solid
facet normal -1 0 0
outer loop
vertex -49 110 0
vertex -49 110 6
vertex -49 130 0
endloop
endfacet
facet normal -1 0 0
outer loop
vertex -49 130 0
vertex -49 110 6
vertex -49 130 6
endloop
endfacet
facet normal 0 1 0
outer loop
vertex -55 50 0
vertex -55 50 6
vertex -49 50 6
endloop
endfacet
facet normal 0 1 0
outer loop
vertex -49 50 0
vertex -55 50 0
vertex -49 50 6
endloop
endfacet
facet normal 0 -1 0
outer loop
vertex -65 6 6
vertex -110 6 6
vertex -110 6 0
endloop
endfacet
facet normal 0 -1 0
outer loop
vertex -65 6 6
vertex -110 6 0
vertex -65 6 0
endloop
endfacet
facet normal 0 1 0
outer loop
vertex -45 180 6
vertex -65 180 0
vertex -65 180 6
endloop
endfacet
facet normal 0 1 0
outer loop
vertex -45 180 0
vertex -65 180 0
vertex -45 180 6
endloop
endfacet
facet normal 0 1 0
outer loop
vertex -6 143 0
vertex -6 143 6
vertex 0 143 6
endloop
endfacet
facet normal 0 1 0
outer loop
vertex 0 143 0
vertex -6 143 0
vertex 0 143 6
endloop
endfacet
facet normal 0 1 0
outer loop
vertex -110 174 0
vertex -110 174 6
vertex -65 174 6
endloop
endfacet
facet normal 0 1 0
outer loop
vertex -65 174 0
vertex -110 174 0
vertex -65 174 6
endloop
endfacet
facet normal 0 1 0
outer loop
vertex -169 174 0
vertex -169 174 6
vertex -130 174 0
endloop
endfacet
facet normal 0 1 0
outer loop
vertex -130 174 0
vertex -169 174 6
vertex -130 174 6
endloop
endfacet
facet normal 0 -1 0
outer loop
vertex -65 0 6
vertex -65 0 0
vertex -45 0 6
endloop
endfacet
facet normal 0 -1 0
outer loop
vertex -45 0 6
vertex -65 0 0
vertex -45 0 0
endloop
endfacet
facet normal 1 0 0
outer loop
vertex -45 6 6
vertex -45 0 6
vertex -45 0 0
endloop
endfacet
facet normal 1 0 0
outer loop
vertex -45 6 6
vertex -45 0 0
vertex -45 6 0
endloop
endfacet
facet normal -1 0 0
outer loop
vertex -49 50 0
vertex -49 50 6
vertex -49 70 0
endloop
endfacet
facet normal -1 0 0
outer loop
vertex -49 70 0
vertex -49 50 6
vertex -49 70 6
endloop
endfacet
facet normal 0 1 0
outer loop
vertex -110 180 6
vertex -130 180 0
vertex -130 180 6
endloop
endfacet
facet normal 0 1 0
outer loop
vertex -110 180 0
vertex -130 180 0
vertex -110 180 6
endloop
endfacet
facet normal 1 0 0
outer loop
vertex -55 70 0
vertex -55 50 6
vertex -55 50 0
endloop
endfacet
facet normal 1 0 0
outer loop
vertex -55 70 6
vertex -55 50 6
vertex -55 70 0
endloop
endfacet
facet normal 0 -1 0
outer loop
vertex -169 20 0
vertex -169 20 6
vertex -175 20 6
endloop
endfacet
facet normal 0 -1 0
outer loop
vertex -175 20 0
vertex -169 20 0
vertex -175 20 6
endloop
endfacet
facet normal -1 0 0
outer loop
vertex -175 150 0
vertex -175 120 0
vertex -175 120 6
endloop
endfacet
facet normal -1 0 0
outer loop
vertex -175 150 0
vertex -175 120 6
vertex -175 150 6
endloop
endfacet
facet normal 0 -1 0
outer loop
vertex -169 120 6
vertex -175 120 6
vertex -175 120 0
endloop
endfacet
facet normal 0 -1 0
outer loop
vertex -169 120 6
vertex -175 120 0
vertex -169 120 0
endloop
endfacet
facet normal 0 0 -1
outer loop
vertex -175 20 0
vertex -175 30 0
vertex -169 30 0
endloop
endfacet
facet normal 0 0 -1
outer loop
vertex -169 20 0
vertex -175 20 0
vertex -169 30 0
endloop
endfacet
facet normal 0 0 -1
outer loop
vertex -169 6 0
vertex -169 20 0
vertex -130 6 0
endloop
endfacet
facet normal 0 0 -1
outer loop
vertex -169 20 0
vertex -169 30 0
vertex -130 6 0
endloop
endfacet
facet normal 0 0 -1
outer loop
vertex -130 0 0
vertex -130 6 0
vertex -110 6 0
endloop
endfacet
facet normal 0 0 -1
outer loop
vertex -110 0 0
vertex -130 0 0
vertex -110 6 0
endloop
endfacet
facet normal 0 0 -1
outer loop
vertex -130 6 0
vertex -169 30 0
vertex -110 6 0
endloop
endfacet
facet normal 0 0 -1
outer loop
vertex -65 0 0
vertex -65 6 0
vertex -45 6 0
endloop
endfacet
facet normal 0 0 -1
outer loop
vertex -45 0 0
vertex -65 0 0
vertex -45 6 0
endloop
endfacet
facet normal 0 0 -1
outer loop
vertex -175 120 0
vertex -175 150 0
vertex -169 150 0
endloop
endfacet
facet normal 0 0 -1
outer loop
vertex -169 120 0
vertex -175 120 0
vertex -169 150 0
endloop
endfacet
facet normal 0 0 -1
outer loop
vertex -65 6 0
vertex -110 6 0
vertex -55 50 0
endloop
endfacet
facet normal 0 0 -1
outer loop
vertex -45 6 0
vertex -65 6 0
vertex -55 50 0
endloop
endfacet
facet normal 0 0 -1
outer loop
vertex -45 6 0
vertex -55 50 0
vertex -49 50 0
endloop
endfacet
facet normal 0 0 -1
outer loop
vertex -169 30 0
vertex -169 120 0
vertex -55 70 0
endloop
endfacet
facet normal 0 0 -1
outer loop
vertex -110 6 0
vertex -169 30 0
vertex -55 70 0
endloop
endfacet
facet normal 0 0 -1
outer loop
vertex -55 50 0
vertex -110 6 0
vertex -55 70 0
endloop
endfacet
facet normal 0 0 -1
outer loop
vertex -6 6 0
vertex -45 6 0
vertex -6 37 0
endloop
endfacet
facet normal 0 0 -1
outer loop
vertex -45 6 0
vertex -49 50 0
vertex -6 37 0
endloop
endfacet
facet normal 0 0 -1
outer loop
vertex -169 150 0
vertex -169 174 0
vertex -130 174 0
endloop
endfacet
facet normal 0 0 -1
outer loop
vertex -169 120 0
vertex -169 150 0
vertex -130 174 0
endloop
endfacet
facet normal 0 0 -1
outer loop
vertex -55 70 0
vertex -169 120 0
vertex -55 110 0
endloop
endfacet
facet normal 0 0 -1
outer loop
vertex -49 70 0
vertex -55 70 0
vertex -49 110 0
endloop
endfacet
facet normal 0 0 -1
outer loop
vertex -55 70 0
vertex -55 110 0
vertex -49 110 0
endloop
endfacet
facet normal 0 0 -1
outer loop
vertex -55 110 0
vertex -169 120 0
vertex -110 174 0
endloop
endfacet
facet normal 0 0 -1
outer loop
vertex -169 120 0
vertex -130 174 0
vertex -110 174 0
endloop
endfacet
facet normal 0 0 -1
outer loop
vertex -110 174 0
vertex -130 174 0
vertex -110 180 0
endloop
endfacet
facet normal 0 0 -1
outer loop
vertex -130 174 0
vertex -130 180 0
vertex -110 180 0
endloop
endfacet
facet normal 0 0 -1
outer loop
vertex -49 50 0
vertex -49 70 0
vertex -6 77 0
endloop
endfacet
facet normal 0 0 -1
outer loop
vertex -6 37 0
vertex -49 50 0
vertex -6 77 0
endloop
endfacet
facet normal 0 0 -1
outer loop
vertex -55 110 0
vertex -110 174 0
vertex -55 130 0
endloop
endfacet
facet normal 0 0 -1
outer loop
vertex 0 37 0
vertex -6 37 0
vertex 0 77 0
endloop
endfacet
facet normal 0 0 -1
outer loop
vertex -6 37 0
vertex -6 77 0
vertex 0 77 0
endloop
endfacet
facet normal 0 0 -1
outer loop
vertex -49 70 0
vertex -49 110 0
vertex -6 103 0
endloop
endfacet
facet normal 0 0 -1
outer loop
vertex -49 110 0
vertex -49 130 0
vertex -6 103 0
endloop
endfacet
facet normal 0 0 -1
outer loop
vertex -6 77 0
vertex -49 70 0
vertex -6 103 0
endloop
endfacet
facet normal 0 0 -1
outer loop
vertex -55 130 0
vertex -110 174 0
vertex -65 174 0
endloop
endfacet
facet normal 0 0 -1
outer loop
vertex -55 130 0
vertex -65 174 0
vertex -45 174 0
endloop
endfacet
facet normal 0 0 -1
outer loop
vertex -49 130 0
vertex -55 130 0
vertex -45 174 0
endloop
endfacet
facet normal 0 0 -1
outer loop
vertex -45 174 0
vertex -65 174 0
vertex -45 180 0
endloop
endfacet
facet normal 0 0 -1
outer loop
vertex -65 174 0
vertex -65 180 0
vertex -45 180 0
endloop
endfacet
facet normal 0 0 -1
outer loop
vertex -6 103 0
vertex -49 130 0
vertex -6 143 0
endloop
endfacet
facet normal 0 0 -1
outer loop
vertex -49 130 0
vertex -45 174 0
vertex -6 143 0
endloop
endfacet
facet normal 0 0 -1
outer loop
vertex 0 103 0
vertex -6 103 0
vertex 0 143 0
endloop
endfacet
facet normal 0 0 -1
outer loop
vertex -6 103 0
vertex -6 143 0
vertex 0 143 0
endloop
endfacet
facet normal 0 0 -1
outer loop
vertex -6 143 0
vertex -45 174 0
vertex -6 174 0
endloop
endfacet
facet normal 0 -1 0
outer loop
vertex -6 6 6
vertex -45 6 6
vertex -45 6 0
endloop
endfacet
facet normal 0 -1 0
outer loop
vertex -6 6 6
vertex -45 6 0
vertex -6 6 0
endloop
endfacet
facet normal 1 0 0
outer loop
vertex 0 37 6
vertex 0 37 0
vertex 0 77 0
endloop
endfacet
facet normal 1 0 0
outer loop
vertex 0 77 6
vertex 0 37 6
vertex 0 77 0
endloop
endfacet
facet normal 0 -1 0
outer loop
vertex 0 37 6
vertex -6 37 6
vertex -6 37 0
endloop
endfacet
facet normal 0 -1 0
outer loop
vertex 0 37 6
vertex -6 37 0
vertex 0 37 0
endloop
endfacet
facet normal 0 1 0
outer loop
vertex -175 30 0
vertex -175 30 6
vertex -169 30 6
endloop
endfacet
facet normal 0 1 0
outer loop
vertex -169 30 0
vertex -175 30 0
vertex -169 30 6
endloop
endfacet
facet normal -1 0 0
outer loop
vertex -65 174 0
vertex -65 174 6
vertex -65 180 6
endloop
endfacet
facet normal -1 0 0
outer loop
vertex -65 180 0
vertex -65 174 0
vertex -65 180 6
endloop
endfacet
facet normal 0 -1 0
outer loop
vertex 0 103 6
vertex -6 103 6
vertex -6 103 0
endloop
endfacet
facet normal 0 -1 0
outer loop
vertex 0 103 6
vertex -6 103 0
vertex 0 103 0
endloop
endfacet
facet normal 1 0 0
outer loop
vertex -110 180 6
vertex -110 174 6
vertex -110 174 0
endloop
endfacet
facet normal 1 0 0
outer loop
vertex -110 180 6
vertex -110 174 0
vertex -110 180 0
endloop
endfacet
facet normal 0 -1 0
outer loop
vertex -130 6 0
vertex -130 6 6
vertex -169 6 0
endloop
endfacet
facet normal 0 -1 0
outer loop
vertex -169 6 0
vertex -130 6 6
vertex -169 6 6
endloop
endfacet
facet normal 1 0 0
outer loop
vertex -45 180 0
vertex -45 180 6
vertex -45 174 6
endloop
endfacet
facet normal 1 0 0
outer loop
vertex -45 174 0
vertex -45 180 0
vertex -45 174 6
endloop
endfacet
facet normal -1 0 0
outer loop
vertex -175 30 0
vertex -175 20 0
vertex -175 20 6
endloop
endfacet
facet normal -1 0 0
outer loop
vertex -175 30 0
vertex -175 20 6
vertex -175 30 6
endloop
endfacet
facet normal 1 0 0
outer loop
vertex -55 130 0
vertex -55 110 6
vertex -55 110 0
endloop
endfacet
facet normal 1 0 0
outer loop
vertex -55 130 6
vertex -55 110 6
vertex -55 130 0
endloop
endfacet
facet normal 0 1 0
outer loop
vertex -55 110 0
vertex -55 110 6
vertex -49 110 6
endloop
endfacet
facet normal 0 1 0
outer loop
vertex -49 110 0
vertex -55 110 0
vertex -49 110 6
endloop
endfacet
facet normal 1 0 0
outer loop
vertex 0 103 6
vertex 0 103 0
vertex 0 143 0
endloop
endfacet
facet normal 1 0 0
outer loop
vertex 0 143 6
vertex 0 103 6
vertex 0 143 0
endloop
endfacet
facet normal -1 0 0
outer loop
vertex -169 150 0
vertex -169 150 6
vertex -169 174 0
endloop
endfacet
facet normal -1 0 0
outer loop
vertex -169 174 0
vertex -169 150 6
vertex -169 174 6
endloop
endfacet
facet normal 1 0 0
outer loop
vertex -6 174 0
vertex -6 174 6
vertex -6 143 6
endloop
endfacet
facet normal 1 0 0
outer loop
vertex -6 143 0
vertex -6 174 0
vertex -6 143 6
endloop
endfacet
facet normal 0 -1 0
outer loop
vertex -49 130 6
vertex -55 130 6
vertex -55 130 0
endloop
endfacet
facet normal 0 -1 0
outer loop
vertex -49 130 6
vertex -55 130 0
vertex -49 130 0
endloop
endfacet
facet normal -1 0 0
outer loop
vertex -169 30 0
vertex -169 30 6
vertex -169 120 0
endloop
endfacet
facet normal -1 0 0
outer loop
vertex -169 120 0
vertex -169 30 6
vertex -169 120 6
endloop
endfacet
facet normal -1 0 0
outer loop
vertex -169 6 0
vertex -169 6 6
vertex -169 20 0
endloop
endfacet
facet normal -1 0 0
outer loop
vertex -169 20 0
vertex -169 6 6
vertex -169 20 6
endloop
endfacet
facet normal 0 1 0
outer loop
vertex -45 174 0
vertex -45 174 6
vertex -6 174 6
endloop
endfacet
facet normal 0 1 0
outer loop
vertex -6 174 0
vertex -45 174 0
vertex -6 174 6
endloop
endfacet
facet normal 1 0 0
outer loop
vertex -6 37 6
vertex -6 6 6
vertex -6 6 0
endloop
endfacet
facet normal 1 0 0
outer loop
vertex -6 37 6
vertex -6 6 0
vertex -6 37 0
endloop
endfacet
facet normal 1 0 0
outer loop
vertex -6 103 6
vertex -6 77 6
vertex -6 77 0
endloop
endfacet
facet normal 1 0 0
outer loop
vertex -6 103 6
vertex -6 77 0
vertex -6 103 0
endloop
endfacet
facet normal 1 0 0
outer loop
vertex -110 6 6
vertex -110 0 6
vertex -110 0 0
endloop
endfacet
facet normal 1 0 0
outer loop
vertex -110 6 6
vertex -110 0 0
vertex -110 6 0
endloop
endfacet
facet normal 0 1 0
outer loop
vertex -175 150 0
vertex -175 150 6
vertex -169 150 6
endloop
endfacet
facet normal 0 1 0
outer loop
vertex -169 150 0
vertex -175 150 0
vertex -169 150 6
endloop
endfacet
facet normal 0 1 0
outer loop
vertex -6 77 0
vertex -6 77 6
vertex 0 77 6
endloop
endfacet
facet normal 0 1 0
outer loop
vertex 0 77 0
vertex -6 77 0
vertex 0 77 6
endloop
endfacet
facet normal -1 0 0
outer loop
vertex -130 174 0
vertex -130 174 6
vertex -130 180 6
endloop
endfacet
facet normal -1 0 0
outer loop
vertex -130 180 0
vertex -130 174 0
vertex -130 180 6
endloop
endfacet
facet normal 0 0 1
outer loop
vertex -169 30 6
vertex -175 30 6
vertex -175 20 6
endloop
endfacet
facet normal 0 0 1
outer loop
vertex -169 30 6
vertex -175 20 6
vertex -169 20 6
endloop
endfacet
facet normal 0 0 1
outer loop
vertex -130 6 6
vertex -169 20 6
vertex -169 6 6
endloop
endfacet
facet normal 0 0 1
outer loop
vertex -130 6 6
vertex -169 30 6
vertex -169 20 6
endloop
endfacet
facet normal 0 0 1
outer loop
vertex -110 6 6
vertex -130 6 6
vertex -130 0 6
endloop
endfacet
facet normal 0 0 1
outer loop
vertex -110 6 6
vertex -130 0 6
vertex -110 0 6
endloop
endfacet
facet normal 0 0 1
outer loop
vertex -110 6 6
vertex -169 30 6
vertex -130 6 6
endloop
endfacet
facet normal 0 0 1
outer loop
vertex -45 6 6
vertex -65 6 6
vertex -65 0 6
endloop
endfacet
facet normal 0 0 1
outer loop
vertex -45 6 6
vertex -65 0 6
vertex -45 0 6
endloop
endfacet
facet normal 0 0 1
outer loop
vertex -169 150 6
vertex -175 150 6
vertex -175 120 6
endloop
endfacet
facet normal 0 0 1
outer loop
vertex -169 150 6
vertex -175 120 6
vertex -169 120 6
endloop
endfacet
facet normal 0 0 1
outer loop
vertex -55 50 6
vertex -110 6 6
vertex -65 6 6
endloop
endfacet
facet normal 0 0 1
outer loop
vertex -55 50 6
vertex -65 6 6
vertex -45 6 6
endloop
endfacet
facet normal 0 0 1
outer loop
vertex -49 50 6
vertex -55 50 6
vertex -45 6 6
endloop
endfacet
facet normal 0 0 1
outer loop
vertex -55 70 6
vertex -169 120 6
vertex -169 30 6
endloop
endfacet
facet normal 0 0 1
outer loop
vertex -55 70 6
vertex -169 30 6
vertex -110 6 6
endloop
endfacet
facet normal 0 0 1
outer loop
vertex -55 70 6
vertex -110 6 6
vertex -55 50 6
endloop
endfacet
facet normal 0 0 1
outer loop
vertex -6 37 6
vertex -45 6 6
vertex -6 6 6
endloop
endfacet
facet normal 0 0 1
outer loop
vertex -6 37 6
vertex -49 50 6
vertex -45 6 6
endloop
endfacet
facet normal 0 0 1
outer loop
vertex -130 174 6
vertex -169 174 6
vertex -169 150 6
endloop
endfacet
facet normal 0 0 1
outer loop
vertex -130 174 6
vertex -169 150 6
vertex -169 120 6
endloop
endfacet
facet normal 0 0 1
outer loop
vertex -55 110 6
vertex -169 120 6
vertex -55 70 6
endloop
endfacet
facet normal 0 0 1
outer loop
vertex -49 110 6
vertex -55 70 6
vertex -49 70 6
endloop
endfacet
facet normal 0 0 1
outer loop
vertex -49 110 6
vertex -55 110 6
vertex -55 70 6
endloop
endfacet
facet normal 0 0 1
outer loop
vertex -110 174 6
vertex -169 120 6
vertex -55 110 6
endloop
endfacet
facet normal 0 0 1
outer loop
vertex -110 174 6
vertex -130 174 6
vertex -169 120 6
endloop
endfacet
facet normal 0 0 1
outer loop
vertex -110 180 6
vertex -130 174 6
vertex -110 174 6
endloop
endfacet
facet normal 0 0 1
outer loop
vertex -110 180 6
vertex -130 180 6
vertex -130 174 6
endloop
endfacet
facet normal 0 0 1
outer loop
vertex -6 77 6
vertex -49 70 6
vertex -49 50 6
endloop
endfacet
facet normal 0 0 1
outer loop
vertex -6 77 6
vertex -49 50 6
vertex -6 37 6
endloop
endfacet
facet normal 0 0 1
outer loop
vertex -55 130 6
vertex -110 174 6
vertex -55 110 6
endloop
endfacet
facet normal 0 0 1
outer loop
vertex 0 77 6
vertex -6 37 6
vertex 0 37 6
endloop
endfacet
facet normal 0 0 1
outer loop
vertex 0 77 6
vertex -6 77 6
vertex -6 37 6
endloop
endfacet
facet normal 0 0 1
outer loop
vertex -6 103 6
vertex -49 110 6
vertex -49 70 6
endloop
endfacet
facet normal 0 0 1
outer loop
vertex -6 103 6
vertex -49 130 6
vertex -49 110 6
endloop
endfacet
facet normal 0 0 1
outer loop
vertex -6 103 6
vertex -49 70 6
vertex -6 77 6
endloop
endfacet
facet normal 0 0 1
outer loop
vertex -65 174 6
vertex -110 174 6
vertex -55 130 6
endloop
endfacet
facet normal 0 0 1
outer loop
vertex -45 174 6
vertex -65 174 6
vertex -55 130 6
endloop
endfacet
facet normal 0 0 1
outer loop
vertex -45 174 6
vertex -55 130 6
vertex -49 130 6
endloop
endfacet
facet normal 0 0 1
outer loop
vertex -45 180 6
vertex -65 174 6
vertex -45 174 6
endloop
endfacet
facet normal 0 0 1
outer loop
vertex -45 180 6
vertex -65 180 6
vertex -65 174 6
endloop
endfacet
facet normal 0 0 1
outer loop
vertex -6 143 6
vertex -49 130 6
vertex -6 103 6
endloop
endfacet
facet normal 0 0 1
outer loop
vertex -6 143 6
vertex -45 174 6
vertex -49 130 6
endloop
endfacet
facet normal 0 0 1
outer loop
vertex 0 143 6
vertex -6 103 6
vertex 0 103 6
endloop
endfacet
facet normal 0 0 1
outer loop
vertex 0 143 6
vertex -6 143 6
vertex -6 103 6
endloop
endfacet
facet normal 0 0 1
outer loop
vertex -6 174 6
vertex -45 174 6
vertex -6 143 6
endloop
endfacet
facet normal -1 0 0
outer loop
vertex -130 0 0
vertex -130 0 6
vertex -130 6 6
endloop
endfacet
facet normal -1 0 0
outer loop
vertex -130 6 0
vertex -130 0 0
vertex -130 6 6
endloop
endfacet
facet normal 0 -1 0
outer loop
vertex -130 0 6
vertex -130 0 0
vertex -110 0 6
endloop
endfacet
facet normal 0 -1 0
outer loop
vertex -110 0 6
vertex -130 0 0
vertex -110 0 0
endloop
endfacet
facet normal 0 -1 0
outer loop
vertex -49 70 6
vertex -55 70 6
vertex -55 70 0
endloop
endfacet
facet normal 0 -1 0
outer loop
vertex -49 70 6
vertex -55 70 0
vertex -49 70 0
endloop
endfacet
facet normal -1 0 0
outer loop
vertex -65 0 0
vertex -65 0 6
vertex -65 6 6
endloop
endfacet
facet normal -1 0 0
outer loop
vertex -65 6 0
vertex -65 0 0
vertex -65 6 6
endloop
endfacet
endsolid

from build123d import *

# Parameters (mm, degrees)
ESQUISSE1_W                  = 175
ESQUISSE1_H                  = 180
BOSS_EXTRU_1_DEPTH           = 6
ESQUISSE2_W                  = 6
ESQUISSE2_H                  = 26
ESQUISSE2_W_2                = 45
ESQUISSE2_H_2                = 6
ESQUISSE2_H_3                = 90
ENL_V_MAT_ENCOCHE_DEPTH      = 252.119493469
ESQUISSE3_W                  = 6
ESQUISSE3_H                  = 20
ENL_V_MAT_ENCOCHE_TAGE_DEPTH = 6


with BuildPart() as part:
    # Esquisse1 → Boss.-Extru.1 (new body)
    with BuildSketch(Plane.XY):
        with Locations((-87.5, 90)):
            Rectangle(ESQUISSE1_W, ESQUISSE1_H)
    extrude(amount=BOSS_EXTRU_1_DEPTH)

    # Esquisse2 → Enl_v. mat encoche (cut, through all)
    with BuildSketch(Plane.XY.offset(6)):
        Polygon((0, 180), (-6, 180), (-45, 180), (-45, 174), (-6, 174), (-6, 143), (0, 143), align=None)
        with Locations((-3, 90)):
            Rectangle(ESQUISSE2_W, ESQUISSE2_H)
        Polygon((0, 0), (-6, 0), (-45, 0), (-45, 6), (-6, 6), (-6, 37), (0, 37), align=None)
        Polygon((-175, 0), (-130, 0), (-130, 6), (-169, 6), (-169, 20), (-175, 20), (-175, 6), align=None)
        with Locations((-87.5, 3)):
            Rectangle(ESQUISSE2_W_2, ESQUISSE2_H_2)
        Polygon((-175, 174), (-175, 150), (-169, 150), (-169, 174), (-130, 174), (-130, 180), (-175, 180), align=None)
        with Locations((-172, 75)):
            Rectangle(ESQUISSE2_W, ESQUISSE2_H_3)
        with Locations((-87.5, 177)):
            Rectangle(ESQUISSE2_W_2, ESQUISSE2_H_2)
    extrude(amount=-ENL_V_MAT_ENCOCHE_DEPTH, mode=Mode.SUBTRACT)

    # Esquisse3 → Enlèv. mat encoche étage (cut)
    with BuildSketch(Plane.XY.offset(6)):
        with Locations((-52, 120)):
            Rectangle(ESQUISSE3_W, ESQUISSE3_H)
        with Locations((-52, 60)):
            Rectangle(ESQUISSE3_W, ESQUISSE3_H)
    extrude(amount=-ENL_V_MAT_ENCOCHE_TAGE_DEPTH, mode=Mode.SUBTRACT)


solid = part.part
